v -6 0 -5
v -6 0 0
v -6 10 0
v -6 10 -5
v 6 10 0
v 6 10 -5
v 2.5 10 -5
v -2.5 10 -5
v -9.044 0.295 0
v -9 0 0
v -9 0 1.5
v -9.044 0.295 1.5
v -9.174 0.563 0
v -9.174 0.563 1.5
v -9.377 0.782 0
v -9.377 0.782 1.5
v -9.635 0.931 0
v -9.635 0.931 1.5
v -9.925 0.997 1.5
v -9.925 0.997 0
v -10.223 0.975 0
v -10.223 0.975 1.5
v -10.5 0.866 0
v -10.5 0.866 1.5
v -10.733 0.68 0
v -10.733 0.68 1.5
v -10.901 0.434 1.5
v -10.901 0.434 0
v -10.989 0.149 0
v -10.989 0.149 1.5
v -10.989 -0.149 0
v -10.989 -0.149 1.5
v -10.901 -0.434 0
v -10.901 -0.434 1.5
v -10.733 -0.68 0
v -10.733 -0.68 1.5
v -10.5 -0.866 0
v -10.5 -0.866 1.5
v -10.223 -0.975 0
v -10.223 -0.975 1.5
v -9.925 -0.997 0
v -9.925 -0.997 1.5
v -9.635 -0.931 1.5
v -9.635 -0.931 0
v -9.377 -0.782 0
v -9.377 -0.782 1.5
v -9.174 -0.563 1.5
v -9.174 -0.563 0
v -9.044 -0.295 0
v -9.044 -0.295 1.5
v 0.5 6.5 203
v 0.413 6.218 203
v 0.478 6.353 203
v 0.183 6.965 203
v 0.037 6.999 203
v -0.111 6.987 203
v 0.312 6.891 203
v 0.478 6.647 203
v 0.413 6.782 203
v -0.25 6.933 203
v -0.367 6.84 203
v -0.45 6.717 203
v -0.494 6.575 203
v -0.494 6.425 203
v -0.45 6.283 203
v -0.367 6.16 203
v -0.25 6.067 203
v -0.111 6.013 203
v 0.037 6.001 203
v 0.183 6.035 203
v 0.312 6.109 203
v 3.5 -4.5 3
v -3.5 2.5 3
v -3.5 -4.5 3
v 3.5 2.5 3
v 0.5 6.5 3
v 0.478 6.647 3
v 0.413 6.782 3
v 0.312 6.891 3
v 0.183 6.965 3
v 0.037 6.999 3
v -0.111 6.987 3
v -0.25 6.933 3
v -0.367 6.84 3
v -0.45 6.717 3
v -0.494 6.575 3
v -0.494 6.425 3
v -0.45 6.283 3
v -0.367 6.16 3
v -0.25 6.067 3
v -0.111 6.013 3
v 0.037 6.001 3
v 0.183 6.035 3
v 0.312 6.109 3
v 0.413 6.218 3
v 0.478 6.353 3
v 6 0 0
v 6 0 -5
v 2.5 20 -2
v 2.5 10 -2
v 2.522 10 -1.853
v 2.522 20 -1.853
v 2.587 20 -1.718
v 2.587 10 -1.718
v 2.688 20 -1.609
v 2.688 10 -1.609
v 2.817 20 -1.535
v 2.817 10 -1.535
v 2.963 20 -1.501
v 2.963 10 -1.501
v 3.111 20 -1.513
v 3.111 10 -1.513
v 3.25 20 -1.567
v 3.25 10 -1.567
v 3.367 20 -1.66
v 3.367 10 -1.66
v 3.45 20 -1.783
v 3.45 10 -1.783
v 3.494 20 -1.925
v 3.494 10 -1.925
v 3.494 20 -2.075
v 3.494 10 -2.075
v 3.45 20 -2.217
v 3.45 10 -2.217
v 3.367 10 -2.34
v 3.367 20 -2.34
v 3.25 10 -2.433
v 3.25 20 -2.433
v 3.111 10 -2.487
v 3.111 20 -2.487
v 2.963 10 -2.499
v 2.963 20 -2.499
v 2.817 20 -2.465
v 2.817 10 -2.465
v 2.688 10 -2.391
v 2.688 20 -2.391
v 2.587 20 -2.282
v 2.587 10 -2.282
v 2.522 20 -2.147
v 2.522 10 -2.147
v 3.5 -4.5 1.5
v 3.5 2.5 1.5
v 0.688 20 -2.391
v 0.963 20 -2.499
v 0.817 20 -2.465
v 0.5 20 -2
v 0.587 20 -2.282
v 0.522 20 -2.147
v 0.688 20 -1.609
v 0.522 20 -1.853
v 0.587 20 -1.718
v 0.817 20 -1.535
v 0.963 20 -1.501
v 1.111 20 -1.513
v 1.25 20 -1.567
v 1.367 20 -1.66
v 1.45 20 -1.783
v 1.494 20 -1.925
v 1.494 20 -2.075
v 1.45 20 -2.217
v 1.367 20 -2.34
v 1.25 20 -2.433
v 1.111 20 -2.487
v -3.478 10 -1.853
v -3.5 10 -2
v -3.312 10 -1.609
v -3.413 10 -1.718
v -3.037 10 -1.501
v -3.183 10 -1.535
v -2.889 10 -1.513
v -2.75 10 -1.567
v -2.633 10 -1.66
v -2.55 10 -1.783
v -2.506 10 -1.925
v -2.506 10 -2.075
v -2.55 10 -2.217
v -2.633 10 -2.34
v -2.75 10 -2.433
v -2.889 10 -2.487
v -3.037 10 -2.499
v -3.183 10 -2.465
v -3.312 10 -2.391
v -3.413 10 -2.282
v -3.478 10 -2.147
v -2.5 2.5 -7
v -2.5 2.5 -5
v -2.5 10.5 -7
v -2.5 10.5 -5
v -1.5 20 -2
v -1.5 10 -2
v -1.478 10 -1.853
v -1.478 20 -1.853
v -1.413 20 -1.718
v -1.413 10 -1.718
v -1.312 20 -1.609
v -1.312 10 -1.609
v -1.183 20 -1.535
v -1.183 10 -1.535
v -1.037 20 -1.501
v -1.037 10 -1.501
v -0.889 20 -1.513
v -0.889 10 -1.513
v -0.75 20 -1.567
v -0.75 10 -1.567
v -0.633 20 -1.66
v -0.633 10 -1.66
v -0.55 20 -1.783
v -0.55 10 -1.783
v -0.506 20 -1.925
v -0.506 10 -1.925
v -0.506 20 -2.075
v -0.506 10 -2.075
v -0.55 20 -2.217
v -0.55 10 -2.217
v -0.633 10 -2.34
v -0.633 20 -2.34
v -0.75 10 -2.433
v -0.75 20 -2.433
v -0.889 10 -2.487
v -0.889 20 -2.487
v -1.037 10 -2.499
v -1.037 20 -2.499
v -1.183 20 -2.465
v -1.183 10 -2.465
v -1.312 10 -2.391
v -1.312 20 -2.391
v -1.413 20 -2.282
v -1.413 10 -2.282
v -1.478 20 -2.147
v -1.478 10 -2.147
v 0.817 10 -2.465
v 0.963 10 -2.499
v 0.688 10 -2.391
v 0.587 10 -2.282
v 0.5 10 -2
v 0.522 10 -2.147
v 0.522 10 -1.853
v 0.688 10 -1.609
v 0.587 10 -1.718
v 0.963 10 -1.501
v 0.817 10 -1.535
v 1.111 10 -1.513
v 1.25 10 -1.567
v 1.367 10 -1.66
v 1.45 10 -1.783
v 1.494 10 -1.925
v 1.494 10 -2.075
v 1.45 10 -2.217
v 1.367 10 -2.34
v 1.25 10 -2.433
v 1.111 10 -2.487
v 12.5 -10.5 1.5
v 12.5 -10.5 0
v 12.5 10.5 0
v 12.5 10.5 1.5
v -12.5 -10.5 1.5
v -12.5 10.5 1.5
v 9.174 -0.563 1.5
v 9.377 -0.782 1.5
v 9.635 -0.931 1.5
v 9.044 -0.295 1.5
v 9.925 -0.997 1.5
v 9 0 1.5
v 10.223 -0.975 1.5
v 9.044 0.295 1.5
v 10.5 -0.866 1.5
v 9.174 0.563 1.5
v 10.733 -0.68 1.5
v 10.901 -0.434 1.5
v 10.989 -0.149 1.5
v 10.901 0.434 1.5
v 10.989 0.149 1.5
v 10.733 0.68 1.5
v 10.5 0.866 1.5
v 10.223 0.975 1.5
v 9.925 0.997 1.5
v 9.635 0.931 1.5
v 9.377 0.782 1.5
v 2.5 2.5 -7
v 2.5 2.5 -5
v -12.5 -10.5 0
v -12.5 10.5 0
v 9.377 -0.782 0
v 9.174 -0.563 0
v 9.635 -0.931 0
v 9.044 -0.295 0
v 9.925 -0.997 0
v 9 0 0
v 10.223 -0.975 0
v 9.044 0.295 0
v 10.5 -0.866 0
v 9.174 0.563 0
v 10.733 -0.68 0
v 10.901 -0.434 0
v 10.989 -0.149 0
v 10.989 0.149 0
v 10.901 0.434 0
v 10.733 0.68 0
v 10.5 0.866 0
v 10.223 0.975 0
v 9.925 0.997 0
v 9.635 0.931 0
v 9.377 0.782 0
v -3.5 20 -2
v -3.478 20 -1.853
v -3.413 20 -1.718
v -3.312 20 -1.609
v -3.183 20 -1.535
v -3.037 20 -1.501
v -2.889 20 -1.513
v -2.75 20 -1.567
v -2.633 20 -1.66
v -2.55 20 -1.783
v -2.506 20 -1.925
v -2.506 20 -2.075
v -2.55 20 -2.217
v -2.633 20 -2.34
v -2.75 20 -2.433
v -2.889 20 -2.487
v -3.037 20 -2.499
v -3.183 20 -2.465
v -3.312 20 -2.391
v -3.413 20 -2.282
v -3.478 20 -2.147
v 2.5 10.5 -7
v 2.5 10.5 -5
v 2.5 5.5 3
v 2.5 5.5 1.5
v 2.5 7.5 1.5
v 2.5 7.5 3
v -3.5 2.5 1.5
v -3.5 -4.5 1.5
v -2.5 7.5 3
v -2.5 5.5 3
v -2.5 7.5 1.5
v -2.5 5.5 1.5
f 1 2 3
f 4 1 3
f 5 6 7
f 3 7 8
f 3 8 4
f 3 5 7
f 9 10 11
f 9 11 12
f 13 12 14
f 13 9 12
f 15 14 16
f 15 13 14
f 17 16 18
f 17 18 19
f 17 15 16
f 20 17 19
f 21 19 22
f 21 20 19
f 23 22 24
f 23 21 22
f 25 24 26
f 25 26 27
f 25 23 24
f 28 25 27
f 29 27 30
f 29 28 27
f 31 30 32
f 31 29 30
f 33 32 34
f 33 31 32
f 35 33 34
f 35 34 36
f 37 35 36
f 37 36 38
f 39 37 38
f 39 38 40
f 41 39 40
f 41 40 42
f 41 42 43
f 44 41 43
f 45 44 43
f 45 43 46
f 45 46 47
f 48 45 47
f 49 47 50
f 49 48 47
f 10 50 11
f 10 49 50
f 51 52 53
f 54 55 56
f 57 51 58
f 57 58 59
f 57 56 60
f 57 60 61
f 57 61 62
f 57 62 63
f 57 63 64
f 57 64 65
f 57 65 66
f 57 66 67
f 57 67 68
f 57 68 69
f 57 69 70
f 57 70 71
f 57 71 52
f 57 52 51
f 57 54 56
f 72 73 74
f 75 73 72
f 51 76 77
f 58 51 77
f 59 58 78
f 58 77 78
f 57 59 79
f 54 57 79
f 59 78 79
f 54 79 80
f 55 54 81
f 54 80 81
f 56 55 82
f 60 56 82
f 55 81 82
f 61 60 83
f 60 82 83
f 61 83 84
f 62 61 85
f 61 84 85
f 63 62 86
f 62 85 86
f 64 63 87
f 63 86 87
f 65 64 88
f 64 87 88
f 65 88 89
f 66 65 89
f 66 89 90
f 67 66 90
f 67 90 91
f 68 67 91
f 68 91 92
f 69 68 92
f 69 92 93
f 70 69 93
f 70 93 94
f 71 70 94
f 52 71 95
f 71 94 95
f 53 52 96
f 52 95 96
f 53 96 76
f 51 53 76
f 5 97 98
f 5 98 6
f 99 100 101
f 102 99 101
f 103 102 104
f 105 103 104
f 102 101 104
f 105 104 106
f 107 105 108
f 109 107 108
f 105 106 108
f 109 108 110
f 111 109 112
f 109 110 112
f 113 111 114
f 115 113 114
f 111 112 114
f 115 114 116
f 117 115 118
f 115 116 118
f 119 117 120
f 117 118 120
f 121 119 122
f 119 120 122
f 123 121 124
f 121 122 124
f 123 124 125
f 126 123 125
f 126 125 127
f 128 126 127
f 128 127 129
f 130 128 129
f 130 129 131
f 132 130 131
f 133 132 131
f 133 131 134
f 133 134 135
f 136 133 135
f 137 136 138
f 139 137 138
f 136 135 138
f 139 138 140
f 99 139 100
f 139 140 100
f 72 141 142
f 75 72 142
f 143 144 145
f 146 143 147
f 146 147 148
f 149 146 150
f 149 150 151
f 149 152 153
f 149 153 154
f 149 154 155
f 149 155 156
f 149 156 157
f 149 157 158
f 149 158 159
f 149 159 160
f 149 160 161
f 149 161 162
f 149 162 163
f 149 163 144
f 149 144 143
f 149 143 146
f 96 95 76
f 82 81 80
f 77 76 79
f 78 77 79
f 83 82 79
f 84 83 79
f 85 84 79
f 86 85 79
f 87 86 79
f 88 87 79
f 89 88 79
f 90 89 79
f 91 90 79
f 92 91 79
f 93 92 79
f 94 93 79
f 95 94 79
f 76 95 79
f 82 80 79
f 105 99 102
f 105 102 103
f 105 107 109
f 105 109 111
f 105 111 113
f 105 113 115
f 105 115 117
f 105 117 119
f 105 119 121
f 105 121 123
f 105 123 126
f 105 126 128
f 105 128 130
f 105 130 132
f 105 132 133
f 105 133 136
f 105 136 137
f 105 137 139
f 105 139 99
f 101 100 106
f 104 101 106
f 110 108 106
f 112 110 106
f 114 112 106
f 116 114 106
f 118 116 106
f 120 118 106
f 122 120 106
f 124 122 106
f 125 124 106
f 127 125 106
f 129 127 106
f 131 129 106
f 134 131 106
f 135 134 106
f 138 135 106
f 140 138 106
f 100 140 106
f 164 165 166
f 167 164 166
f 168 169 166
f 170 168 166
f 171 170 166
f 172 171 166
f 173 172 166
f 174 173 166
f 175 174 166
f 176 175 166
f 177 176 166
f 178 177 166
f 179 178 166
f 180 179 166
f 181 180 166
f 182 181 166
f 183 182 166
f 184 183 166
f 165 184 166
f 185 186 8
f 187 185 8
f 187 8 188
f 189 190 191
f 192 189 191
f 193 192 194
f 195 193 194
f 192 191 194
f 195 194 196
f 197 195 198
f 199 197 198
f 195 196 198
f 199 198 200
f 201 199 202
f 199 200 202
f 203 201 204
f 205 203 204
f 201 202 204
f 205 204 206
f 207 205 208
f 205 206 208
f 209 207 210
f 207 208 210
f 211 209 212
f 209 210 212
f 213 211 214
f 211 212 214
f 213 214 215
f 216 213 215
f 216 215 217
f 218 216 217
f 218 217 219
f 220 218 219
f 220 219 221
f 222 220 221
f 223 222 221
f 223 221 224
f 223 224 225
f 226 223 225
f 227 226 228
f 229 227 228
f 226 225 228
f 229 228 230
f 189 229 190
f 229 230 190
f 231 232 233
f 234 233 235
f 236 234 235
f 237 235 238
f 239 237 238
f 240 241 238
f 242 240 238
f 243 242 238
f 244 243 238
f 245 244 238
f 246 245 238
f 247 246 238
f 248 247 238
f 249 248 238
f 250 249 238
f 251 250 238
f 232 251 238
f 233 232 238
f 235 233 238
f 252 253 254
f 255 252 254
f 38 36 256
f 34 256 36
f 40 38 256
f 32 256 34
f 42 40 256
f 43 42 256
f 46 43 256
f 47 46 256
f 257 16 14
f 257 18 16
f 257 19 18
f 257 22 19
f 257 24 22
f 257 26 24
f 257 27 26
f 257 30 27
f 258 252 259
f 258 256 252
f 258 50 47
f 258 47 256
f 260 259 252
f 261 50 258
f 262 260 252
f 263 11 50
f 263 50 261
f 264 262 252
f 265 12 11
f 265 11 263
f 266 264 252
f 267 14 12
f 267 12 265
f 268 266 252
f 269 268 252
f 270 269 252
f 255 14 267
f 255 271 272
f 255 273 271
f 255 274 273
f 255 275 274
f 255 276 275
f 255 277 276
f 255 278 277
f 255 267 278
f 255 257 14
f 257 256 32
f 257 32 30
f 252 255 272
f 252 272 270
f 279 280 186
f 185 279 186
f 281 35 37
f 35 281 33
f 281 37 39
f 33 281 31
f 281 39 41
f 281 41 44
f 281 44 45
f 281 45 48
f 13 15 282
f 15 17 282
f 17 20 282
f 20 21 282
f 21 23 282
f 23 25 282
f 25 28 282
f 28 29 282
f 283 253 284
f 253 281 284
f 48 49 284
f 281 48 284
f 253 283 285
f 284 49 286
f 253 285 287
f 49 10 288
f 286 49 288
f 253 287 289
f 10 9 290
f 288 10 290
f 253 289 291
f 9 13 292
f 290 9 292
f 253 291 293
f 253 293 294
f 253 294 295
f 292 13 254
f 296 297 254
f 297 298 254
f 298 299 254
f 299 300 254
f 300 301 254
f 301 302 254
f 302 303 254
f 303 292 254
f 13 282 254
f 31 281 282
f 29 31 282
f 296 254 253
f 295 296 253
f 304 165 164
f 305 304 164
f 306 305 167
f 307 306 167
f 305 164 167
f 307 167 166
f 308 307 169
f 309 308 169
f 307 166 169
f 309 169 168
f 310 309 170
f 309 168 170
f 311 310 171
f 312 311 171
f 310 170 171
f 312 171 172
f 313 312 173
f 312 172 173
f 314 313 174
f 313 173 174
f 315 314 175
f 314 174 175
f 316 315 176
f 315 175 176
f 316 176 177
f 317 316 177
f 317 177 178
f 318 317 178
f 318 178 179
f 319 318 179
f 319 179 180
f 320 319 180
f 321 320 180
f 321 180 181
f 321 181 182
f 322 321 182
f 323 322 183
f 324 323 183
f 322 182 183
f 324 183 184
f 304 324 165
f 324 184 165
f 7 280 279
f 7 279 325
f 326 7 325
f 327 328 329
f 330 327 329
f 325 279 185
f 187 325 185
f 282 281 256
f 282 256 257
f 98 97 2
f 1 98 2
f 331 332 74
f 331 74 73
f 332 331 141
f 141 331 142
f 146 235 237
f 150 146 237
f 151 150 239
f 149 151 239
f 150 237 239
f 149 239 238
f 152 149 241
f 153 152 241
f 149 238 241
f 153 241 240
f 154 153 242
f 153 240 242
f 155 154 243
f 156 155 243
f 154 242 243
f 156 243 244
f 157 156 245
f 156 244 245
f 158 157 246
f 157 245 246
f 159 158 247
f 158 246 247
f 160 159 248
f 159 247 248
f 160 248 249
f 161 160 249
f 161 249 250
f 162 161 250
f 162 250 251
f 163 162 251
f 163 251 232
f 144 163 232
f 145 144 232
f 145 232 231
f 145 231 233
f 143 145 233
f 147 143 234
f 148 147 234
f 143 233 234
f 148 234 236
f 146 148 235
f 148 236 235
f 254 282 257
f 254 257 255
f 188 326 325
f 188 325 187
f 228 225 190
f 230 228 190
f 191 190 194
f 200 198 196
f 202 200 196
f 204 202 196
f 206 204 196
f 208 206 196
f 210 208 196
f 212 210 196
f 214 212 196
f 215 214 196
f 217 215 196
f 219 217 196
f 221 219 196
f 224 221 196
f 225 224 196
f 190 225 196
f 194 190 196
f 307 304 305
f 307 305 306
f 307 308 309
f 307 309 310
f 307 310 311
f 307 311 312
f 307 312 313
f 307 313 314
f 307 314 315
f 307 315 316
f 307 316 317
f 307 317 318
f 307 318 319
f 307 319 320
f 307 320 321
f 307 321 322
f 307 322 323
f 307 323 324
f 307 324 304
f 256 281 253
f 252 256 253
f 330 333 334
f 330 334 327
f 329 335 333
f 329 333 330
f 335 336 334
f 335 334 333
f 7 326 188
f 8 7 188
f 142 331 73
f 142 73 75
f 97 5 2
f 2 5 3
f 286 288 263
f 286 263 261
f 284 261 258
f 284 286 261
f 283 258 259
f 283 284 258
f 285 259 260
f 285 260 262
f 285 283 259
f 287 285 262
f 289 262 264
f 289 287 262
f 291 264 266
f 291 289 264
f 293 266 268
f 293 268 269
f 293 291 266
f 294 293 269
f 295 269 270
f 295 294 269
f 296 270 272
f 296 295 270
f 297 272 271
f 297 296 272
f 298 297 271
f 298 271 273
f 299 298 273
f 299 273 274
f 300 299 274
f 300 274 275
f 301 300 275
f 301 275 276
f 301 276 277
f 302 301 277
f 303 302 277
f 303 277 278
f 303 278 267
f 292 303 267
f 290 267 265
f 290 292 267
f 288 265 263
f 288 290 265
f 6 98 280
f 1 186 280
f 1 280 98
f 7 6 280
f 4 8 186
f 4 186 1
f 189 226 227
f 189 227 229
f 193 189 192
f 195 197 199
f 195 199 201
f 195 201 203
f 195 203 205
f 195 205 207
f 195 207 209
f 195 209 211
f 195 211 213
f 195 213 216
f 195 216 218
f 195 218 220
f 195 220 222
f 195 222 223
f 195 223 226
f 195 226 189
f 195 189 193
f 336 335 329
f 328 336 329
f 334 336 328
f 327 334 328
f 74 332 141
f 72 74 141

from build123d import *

# Parameters (mm, degrees)
ESQUISSE1_W          = 25
ESQUISSE1_H          = 21
ESQUISSE1_R          = 1
BOSS_EXTRU_1_DEPTH   = 1.5
ESQUISSE2_W          = 12
ESQUISSE2_H          = 10
BOSS_EXTRU_2_DEPTH   = 5
ESQUISSE3_W          = 5
ESQUISSE3_H          = 2
BOSS_EXTRU_3_DEPTH   = 1.5
ESQUISSE3_W_2        = 7
ESQUISSE3_H_2        = 7
BOSS_EXTRU_3_2_DEPTH = 1.5
ESQUISSE4_W          = 5
ESQUISSE4_H          = 8
BOSS_EXTRU_4_DEPTH   = 2
ESQUISSE5_R          = 0.5
BOSS_EXTRU_5_DEPTH   = 10
BOSS_EXTRU_5_2_DEPTH = 10
BOSS_EXTRU_5_3_DEPTH = 10
BOSS_EXTRU_5_4_DEPTH = 10
ESQUISSE6_R          = 0.5
BOSS_EXTRU_6_DEPTH   = 200


with BuildPart() as part:
    # Esquisse1 → Boss.-Extru.1 (new body)
    with BuildSketch(Plane.XY):
        Rectangle(ESQUISSE1_W, ESQUISSE1_H)
        with Locations((-10, 0)):
            Circle(ESQUISSE1_R, mode=Mode.SUBTRACT)
        with Locations(Location((10, 0, 0), (0, 0, 180))):
            Circle(ESQUISSE1_R, mode=Mode.SUBTRACT)
    extrude(amount=BOSS_EXTRU_1_DEPTH)


with BuildPart() as body_2:
    # Esquisse2 → Boss.-Extru.2 (new body)
    with BuildSketch(Plane(origin=(0, 0, 0), x_dir=(-1, 0, 0), z_dir=(0, 0, -1))):
        with Locations((0, 5)):
            Rectangle(ESQUISSE2_W, ESQUISSE2_H)
    extrude(amount=BOSS_EXTRU_2_DEPTH)

    # Esquisse4 → Boss.-Extru.4 (add)
    with BuildSketch(Plane(origin=(0, 0, -5), x_dir=(-1, 0, 0), z_dir=(0, 0, -1))):
        with Locations((0, 6.5)):
            Rectangle(ESQUISSE4_W, ESQUISSE4_H)
    extrude(amount=BOSS_EXTRU_4_DEPTH)


with BuildPart() as body_3:
    # Esquisse3 → Boss.-Extru.3 (new body)
    with BuildSketch(Plane.XY.offset(1.5)):
        with Locations((0, 6.5)):
            Rectangle(ESQUISSE3_W, ESQUISSE3_H)
    extrude(amount=BOSS_EXTRU_3_DEPTH)


with BuildPart() as body_4:
    # Esquisse3 → Boss.-Extru.3 2 (new body)
    with BuildSketch(Plane.XY.offset(1.5)):
        with Locations((0, -1)):
            Rectangle(ESQUISSE3_W_2, ESQUISSE3_H_2)
    extrude(amount=BOSS_EXTRU_3_2_DEPTH)


with BuildPart() as body_5:
    # Esquisse5 → Boss.-Extru.5 (new body)
    with BuildSketch(Plane(origin=(0, 10, 0), x_dir=(1, 0, 0), z_dir=(0, 1, 0))):
        with Locations(Location((-3, 2, 0), (0, 0, 180))):
            Circle(ESQUISSE5_R)
    extrude(amount=BOSS_EXTRU_5_DEPTH)


with BuildPart() as body_6:
    # Esquisse5 → Boss.-Extru.5 2 (new body)
    with BuildSketch(Plane(origin=(0, 10, 0), x_dir=(1, 0, 0), z_dir=(0, 1, 0))):
        with Locations(Location((-1, 2, 0), (0, 0, 180))):
            Circle(ESQUISSE5_R)
    extrude(amount=BOSS_EXTRU_5_2_DEPTH)


with BuildPart() as body_7:
    # Esquisse5 → Boss.-Extru.5 3 (new body)
    with BuildSketch(Plane(origin=(0, 10, 0), x_dir=(1, 0, 0), z_dir=(0, 1, 0))):
        with Locations(Location((1, 2, 0), (0, 0, 180))):
            Circle(ESQUISSE5_R)
    extrude(amount=BOSS_EXTRU_5_3_DEPTH)


with BuildPart() as body_8:
    # Esquisse5 → Boss.-Extru.5 4 (new body)
    with BuildSketch(Plane(origin=(0, 10, 0), x_dir=(1, 0, 0), z_dir=(0, 1, 0))):
        with Locations(Location((3, 2, 0), (0, 0, 180))):
            Circle(ESQUISSE5_R)
    extrude(amount=BOSS_EXTRU_5_4_DEPTH)


with BuildPart() as body_9:
    # Esquisse6 → Boss.-Extru.6 (new body)
    with BuildSketch(Plane.XY.offset(3)):
        with Locations((0, 6.5)):
            Circle(ESQUISSE6_R)
    extrude(amount=BOSS_EXTRU_6_DEPTH)


solid = Compound([part.part, body_2.part, body_3.part, body_4.part, body_5.part, body_6.part, body_7.part, body_8.part, body_9.part])
